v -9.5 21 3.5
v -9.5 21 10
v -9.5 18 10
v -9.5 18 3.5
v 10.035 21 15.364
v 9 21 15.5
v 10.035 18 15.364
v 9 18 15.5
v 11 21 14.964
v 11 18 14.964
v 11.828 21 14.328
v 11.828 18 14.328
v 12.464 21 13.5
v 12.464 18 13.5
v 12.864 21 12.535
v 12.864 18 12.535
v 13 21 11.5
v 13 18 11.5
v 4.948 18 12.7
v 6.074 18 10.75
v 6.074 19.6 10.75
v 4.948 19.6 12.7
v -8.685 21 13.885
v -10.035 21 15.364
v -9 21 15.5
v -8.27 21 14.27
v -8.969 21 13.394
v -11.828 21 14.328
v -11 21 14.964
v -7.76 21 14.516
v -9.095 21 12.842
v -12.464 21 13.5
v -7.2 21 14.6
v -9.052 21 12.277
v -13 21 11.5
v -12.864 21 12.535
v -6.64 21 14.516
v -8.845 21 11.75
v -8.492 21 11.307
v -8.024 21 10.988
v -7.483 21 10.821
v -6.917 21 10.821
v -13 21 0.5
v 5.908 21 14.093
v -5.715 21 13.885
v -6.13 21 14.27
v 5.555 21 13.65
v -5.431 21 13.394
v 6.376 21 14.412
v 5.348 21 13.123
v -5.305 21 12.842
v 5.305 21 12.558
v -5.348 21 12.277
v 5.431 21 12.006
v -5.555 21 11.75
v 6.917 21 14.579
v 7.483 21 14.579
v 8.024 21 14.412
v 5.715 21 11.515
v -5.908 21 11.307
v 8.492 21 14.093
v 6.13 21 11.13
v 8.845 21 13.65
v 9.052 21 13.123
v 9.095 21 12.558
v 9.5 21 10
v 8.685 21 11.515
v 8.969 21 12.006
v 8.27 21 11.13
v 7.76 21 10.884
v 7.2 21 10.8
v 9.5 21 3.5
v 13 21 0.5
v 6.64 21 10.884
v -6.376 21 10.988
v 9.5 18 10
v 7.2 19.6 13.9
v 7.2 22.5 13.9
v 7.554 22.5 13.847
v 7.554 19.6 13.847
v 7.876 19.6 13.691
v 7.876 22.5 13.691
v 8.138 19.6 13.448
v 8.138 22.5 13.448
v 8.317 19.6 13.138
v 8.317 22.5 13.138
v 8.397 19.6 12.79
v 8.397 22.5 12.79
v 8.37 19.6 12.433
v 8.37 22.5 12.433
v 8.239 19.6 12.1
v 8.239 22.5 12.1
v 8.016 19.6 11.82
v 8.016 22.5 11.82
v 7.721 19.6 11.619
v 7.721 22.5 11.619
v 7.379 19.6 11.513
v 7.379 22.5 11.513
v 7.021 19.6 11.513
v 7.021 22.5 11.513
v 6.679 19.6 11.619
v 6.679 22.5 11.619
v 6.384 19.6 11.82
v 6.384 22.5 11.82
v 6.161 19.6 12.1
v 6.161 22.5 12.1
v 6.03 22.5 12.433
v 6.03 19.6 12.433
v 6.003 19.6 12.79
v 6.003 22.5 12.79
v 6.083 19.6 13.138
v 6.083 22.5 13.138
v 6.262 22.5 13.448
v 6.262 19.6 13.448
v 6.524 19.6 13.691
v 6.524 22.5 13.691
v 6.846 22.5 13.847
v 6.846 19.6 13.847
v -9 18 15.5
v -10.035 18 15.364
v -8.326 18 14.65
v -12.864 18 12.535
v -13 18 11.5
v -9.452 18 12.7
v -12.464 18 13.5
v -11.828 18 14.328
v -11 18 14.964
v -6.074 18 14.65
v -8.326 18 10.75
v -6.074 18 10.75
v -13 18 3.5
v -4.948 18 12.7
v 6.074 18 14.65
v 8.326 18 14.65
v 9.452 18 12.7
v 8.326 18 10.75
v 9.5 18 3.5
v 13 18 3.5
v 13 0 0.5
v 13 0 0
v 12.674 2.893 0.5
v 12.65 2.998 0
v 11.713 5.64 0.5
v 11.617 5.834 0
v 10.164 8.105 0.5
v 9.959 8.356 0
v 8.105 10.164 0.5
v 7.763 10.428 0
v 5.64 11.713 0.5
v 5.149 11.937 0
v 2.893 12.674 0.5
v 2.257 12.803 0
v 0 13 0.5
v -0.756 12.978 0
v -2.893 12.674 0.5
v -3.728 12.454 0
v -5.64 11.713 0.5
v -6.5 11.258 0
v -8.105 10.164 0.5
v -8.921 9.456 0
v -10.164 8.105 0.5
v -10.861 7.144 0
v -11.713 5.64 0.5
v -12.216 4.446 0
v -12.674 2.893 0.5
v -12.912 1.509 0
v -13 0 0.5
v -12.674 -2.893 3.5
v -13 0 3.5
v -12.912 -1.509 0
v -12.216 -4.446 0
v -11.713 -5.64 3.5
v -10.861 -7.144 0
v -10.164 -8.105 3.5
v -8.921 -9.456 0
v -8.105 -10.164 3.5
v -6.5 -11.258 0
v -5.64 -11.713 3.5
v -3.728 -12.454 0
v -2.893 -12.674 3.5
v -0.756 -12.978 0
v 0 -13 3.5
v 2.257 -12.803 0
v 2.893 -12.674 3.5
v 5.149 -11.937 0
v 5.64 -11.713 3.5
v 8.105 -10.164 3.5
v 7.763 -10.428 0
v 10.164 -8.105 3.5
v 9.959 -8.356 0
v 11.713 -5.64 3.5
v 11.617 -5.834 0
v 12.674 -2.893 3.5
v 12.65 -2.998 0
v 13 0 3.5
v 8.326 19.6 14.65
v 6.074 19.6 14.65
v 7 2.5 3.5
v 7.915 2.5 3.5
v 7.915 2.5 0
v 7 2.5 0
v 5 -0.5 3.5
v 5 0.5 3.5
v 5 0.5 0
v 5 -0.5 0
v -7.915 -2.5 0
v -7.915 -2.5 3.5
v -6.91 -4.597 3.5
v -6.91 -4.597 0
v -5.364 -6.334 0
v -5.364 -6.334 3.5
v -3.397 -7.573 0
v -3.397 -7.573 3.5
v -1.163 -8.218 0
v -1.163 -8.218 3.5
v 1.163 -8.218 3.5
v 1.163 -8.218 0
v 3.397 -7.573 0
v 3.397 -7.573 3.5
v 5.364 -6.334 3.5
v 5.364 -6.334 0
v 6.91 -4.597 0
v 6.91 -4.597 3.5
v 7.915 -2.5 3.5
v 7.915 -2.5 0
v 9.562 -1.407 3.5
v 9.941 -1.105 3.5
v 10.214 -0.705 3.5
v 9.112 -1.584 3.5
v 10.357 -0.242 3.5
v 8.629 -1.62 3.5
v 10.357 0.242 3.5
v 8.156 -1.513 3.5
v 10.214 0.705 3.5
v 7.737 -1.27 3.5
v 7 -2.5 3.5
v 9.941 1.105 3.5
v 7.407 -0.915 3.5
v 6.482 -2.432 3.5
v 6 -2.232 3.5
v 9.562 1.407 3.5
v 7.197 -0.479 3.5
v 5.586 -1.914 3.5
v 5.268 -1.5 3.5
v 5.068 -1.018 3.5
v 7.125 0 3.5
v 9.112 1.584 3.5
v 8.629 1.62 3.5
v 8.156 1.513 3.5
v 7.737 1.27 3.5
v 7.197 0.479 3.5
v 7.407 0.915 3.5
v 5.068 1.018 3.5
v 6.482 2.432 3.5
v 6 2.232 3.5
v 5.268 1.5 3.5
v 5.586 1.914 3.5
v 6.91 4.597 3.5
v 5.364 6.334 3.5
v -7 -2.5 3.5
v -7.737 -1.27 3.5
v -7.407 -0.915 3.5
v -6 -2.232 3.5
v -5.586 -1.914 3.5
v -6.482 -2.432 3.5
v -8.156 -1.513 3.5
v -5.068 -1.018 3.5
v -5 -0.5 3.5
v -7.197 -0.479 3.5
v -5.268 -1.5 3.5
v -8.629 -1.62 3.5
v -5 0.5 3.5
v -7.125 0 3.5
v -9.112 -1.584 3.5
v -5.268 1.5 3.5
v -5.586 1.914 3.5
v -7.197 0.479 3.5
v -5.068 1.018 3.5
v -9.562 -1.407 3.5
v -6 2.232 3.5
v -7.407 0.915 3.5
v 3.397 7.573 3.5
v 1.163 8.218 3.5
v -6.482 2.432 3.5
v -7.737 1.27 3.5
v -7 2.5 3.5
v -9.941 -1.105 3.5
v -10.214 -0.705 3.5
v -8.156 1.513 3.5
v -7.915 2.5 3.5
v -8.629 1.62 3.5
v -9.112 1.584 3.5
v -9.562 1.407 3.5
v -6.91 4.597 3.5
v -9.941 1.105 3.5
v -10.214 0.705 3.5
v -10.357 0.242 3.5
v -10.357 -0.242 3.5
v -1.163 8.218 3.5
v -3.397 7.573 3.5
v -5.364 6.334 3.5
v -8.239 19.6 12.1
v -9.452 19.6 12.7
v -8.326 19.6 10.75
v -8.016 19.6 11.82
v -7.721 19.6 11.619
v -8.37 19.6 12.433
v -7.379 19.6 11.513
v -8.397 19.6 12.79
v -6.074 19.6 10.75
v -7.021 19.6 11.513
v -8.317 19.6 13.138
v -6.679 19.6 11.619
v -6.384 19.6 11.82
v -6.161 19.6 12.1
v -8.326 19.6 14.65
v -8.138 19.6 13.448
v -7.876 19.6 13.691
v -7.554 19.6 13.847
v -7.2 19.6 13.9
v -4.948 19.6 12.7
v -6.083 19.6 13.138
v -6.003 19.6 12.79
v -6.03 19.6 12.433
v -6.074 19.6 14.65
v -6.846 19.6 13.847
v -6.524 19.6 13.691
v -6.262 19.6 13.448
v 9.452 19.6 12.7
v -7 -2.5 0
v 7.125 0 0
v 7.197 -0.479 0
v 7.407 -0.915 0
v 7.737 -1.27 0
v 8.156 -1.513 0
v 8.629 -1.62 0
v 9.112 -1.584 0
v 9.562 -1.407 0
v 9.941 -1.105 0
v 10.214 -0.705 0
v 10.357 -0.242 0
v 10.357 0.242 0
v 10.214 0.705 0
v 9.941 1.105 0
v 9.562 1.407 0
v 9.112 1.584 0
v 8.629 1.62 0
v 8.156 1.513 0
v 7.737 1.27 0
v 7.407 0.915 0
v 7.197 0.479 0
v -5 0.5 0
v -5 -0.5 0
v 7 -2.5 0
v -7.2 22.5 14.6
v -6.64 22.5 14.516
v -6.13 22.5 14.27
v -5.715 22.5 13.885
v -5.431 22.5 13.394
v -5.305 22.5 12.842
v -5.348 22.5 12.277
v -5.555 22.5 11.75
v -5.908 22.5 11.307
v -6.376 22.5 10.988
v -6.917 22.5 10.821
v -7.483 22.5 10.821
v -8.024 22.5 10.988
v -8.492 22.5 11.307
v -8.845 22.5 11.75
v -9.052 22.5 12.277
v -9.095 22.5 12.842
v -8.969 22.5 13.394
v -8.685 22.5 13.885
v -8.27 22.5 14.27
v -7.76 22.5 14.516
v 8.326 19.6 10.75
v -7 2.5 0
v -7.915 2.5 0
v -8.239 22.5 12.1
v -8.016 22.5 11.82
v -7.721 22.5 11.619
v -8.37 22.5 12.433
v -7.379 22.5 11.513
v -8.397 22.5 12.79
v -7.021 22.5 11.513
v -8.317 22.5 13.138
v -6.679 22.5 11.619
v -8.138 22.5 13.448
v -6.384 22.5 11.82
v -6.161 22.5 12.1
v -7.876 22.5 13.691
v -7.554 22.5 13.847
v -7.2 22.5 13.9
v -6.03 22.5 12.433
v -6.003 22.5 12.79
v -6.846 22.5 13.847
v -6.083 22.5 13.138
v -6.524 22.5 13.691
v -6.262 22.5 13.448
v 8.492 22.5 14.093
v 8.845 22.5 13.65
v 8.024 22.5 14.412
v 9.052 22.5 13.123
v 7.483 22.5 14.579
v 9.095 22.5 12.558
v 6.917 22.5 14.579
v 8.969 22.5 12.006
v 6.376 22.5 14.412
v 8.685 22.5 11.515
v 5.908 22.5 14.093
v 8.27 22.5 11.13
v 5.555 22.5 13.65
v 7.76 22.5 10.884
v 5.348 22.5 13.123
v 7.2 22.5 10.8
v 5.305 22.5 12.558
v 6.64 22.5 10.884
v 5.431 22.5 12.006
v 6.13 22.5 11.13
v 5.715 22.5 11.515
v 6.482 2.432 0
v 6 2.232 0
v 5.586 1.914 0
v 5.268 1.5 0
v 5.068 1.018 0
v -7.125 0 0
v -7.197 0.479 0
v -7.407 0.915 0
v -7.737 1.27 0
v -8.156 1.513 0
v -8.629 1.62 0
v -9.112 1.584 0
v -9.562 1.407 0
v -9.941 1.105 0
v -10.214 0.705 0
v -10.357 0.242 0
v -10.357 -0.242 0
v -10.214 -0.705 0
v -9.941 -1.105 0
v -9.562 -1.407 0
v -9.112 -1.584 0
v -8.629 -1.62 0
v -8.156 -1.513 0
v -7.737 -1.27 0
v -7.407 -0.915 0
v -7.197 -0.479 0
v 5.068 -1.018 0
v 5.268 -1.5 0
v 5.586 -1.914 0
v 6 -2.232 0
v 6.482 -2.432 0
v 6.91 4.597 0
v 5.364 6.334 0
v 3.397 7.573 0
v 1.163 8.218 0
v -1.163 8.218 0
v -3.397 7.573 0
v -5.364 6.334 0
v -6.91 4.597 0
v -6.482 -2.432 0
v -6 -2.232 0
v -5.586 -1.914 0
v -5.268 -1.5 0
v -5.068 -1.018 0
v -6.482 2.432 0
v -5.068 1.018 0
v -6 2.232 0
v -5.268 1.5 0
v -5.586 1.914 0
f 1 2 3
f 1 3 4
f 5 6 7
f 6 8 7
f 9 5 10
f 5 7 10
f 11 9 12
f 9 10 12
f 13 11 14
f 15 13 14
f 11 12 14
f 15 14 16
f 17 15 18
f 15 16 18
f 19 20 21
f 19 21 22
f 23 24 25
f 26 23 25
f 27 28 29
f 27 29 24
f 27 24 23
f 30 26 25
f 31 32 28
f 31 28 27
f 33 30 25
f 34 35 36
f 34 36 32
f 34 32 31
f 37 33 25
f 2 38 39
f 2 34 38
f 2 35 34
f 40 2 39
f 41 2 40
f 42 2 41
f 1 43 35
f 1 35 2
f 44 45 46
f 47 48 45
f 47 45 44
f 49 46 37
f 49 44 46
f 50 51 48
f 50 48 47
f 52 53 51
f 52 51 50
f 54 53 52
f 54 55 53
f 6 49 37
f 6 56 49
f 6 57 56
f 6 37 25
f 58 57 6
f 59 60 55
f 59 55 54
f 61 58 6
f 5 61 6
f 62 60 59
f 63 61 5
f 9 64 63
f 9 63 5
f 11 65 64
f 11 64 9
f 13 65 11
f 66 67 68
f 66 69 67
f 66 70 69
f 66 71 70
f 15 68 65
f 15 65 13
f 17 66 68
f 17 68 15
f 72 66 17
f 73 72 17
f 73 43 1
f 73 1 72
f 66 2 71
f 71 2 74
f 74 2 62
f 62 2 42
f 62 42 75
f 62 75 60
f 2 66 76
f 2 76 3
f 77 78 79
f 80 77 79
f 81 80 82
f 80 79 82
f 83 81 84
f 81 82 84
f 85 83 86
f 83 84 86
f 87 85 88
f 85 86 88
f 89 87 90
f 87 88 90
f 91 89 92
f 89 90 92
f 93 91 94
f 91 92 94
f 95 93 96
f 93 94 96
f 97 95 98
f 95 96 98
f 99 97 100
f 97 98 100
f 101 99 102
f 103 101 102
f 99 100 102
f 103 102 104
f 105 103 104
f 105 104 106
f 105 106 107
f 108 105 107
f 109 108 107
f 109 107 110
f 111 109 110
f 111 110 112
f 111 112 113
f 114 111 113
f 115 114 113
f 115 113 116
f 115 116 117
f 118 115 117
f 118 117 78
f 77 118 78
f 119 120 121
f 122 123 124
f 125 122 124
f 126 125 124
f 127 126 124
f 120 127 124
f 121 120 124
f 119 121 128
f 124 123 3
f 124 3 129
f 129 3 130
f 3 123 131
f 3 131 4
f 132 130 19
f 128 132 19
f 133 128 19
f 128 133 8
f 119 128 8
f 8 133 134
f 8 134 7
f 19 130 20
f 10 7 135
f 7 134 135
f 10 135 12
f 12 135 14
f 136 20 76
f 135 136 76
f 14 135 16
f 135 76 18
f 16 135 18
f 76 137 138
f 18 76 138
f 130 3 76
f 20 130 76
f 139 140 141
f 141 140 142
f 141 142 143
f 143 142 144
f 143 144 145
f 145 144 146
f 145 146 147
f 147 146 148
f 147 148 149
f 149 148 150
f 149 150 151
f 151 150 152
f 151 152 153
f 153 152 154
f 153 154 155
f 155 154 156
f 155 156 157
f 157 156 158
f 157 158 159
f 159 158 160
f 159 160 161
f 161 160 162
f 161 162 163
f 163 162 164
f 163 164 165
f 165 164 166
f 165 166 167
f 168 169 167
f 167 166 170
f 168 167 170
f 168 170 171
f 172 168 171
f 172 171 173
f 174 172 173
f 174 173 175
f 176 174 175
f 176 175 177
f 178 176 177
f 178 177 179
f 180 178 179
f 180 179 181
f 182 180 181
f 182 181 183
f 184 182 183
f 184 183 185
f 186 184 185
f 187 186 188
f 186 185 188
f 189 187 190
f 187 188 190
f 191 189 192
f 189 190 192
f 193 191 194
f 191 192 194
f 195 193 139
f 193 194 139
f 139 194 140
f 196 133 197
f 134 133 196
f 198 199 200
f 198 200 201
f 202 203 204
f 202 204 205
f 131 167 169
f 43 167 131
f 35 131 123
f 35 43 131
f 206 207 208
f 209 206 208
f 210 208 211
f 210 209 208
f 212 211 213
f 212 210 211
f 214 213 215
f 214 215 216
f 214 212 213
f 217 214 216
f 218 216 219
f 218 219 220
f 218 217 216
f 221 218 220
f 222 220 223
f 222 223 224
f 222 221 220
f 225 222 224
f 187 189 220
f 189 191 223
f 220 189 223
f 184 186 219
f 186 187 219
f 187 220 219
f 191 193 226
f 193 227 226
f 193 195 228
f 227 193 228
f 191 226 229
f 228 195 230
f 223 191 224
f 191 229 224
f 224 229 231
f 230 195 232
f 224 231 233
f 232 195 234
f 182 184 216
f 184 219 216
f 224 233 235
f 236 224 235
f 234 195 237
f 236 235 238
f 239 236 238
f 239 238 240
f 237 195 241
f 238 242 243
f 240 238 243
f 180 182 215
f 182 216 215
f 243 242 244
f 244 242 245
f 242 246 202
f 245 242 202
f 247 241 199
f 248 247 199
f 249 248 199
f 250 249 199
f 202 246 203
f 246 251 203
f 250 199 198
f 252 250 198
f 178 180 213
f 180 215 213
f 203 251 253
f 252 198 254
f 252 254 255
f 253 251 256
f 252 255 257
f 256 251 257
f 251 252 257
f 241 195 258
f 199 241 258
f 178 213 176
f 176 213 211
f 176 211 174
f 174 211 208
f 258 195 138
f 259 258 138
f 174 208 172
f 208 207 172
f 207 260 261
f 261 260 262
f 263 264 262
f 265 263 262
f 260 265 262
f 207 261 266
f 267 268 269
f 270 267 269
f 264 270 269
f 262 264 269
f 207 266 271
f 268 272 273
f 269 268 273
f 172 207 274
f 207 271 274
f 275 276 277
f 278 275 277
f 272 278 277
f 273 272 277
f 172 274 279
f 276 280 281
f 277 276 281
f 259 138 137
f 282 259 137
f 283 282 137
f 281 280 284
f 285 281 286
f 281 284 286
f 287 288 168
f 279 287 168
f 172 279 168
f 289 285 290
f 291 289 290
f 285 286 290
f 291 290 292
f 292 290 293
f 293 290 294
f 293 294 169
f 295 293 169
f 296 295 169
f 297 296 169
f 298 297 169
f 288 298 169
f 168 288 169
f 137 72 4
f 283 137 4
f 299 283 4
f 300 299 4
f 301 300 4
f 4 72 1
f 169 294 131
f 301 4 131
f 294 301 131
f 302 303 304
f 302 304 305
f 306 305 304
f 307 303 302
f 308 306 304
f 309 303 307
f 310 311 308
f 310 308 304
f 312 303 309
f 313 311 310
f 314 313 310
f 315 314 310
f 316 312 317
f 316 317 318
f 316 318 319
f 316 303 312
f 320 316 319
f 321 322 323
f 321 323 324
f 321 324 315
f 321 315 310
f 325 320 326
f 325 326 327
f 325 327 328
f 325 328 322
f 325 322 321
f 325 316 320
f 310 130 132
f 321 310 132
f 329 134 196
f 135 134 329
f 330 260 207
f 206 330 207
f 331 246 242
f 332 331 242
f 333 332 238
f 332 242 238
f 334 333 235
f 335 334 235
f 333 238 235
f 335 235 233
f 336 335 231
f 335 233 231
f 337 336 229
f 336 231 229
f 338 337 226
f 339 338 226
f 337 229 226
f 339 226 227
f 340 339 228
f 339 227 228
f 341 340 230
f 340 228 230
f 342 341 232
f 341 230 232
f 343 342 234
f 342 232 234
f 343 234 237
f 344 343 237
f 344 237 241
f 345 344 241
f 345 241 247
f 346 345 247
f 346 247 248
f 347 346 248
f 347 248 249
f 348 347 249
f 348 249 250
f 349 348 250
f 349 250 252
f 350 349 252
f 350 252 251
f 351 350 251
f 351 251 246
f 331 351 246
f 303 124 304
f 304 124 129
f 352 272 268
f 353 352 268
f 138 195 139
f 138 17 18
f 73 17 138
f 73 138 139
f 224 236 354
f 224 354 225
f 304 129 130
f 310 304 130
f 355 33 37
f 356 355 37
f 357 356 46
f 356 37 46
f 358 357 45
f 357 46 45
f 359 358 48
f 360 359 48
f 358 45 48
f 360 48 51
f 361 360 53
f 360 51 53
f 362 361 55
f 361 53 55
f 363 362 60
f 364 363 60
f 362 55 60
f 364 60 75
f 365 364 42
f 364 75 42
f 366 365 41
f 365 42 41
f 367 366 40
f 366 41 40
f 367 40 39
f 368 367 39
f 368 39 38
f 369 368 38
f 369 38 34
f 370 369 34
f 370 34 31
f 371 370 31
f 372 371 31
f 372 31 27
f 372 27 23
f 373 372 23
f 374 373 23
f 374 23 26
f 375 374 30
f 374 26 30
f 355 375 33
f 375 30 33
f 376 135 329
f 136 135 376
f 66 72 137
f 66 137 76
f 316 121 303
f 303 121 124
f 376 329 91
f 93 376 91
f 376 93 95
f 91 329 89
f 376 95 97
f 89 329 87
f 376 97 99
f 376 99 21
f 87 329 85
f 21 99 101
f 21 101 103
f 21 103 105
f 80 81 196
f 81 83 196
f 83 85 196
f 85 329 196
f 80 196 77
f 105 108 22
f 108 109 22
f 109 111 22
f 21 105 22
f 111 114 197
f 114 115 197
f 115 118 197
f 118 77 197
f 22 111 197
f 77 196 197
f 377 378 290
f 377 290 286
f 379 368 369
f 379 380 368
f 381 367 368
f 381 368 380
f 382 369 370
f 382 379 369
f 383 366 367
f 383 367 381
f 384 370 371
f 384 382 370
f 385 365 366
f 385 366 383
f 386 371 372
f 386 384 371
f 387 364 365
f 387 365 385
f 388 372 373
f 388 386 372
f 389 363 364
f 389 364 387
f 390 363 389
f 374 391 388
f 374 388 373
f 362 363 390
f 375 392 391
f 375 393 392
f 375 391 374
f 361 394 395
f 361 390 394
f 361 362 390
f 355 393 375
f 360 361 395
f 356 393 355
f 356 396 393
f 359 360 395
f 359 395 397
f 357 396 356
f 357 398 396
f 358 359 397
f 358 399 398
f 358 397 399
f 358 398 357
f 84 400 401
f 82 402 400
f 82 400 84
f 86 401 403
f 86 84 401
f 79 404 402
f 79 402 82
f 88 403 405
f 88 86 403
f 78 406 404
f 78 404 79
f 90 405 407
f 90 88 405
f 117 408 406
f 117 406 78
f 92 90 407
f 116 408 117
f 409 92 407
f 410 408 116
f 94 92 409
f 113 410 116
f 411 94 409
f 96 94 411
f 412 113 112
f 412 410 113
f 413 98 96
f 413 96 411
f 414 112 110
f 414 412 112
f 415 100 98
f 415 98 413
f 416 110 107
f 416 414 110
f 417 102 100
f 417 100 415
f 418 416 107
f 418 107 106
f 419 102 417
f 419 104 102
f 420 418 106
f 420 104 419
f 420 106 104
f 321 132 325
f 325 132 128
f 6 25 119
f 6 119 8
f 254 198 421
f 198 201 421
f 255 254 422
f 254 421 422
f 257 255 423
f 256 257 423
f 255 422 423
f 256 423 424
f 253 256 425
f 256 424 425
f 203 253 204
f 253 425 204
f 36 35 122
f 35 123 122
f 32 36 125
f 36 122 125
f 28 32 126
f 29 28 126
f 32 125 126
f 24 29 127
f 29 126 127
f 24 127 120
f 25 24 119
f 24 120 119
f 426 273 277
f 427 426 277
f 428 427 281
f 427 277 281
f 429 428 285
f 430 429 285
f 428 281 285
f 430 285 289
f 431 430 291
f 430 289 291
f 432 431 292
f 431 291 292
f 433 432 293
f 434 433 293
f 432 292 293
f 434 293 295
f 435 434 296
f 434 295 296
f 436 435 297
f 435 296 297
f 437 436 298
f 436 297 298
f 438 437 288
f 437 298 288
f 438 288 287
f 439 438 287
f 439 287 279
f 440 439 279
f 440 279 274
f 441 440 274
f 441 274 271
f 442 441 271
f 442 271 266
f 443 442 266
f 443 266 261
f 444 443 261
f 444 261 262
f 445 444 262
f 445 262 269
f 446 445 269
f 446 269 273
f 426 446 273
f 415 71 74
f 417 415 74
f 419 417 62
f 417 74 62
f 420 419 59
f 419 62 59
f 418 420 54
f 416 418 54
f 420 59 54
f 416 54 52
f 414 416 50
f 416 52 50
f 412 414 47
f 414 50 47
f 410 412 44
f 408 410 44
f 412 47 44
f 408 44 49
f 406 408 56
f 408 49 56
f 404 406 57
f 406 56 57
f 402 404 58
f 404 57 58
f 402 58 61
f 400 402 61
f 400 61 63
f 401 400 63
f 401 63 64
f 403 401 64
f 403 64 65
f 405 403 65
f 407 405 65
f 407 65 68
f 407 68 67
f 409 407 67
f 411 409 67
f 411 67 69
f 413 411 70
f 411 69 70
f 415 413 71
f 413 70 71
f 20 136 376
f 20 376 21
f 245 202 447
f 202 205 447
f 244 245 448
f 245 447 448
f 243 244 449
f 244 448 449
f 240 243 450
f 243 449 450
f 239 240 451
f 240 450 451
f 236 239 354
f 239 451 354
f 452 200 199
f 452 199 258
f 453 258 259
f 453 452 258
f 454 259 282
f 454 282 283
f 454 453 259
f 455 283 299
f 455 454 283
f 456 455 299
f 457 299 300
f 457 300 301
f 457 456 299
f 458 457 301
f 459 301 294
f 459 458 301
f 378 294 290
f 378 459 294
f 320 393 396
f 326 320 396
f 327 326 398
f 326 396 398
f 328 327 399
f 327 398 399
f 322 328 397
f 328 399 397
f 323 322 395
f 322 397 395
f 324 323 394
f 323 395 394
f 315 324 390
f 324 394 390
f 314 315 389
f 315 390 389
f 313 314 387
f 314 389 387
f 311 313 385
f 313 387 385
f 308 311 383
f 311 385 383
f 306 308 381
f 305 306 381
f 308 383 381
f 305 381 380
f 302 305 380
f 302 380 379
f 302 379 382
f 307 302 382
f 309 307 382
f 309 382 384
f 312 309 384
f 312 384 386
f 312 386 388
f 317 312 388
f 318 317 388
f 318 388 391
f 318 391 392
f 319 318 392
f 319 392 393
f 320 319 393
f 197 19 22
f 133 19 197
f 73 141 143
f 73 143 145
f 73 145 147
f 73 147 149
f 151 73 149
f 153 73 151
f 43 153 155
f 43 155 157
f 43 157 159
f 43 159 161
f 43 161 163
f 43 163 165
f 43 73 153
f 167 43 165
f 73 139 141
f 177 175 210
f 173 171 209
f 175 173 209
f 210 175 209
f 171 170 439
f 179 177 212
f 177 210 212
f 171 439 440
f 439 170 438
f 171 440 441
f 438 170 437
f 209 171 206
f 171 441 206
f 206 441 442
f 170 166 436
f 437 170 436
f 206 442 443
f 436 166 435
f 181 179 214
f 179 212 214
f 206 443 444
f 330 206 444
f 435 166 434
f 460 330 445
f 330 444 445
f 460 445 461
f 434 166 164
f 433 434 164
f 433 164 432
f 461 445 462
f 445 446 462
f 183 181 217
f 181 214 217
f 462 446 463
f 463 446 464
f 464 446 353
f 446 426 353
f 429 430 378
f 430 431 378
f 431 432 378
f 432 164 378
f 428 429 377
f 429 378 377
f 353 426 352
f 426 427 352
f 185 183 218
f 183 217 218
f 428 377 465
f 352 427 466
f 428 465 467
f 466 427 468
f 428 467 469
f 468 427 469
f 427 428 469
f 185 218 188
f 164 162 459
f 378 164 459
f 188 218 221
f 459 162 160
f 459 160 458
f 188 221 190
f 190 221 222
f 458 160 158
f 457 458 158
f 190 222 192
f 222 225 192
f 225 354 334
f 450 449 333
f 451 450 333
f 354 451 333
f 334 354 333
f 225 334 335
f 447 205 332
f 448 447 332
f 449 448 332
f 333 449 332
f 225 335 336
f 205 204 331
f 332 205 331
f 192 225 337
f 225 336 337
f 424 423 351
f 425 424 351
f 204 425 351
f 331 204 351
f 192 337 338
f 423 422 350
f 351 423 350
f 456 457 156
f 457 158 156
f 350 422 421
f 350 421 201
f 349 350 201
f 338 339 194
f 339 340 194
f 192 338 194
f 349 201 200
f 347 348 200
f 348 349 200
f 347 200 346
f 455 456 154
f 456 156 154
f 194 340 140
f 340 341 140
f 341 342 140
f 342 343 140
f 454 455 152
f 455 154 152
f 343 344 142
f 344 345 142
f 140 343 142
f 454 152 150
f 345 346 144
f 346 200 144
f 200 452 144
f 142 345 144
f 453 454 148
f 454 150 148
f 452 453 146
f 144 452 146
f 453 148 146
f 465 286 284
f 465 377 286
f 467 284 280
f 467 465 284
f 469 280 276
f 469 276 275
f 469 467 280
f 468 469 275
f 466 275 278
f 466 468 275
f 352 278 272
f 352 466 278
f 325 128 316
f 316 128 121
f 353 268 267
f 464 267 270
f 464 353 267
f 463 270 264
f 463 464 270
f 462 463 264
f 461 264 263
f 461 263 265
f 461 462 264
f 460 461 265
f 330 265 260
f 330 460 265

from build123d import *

# Parameters (mm, degrees)
ESBO_O1_R                = 13
ESBO_O1_R_2              = 8.3
RESSALTO_EXTRUS_O1_DEPTH = 3.5
RESSALTO_EXTRUS_O2_DEPTH = 3.5
ESBO_O4_R                = 1.625
CORTE_EXTRUS_O2_DEPTH    = 19.714967272
FILETE1_R                = 2
RESSALTO_EXTRUS_O4_START = -3
RESSALTO_EXTRUS_O4_DEPTH = 3
RESSALTO_EXTRUS_O5_DEPTH = 3
ESBO_O9_R                = 1.9
RESSALTO_EXTRUS_O6_DEPTH = 1.5
ESBO_O10_R               = 1.2
CORTE_EXTRUS_O3_DEPTH    = 41.859515416
CORTE_EXTRUS_O4_DEPTH    = 1.6
FILETE2_R                = 4


with BuildPart() as part:
    # Esboço1 → Ressalto-extrusão1 (new body)
    with BuildSketch(Plane.XY):
        Circle(ESBO_O1_R)
        Circle(ESBO_O1_R_2, mode=Mode.SUBTRACT)
    extrude(amount=RESSALTO_EXTRUS_O1_DEPTH)

    # Esboço3 → Ressalto-extrusão2 (add, through all)
    with BuildSketch(Plane.XY.offset(3.5)):
        with BuildLine():
            Line((-8.124038405, 2.5), (-5, 2.5))
            Line((-5, 2.5), (-5, -2.5))
            Line((-5, -2.5), (-8.124038405, -2.5))
            ThreePointArc((-8.124038405, -2.5), (-8.5, 0), (-8.124038405, 2.5))
        make_face()
        with BuildLine():
            Line((5, 2.5), (5, -2.5))
            Line((5, -2.5), (8.124038405, -2.5))
            ThreePointArc((8.124038405, -2.5), (8.5, 0), (8.124038405, 2.5))
            Line((8.124038405, 2.5), (5, 2.5))
        make_face()
    extrude(amount=-RESSALTO_EXTRUS_O2_DEPTH)

    # Esboço4 → Corte-extrusão2 (cut, through all)
    with BuildSketch(Plane.XY.offset(3.5)):
        with Locations((-8.75, 0)):
            Circle(ESBO_O4_R)
        with Locations(Location((8.75, 0, 0), (0, 0, 180))):
            Circle(ESBO_O4_R)
    extrude(amount=-CORTE_EXTRUS_O2_DEPTH, mode=Mode.SUBTRACT)

    # Filete1
    filete1_edges = [part.edges().sort_by_distance(p)[0] for p in [
        (-5, 2.5, 1.75),
        (-5, -2.5, 1.75),
        (5, -2.5, 1.75),
        (5, 2.5, 1.75),
    ]]
    fillet(filete1_edges, radius=FILETE1_R)

    # Esboço7 → Ressalto-extrusão4 (add)
    with BuildSketch(Plane.XY.offset(3.5).offset(RESSALTO_EXTRUS_O4_START)):
        with BuildLine():
            Line((-13, 0), (-13, 21))
            Line((-13, 21), (13, 21))
            Line((13, 21), (13, 0))
            ThreePointArc((13, 0), (0, 13), (-13, 0))
        make_face()
    extrude(amount=RESSALTO_EXTRUS_O4_DEPTH)

    # Esboço8 → Ressalto-extrusão5 (add)
    with BuildSketch(Plane(origin=(0, 21, 0), x_dir=(1, 0, 0), z_dir=(0, 1, 0))):
        Polygon((-13, -3.5), (-13, -15.5), (13, -15.5), (13, -3.5), (9.5, -3.5), (9.5, -10), (-9.5, -10), (-9.5, -3.5), align=None)
    extrude(amount=-RESSALTO_EXTRUS_O5_DEPTH)

    # Esboço9 → Ressalto-extrusão6 (add)
    with BuildSketch(Plane(origin=(0, 21, 0), x_dir=(1, 0, 0), z_dir=(0, 1, 0))):
        with Locations(Location((-7.2, -12.7, 0), (0, 0, 270))):
            Circle(ESBO_O9_R)
        with Locations(Location((7.2, -12.7, 0), (0, 0, 90))):
            Circle(ESBO_O9_R)
    extrude(amount=RESSALTO_EXTRUS_O6_DEPTH)

    # Esboço10 → Corte-extrusão3 (cut, through all)
    with BuildSketch(Plane(origin=(0, 22.5, 0), x_dir=(1, 0, 0), z_dir=(0, 1, 0))):
        with Locations(Location((-7.2, -12.7, 0), (0, 0, 270))):
            Circle(ESBO_O10_R)
        with Locations(Location((7.2, -12.7, 0), (0, 0, 270))):
            Circle(ESBO_O10_R)
    extrude(amount=-CORTE_EXTRUS_O3_DEPTH, mode=Mode.SUBTRACT)

    # Esboço11 → Corte-extrusão4 (cut)
    with BuildSketch(Plane.XZ.offset(-18)):
        Polygon((-4.94833395, 12.7), (-6.074166975, 14.65), (-8.325833025, 14.65), (-9.45166605, 12.7), (-8.325833025, 10.75), (-6.074166975, 10.75), align=None)
        Polygon((6.074166975, 10.75), (4.94833395, 12.7), (6.074166975, 14.65), (8.325833025, 14.65), (9.45166605, 12.7), (8.325833025, 10.75), align=None)
    extrude(amount=-CORTE_EXTRUS_O4_DEPTH, mode=Mode.SUBTRACT)

    # Filete2
    filete2_edges = [part.edges().sort_by_distance(p)[0] for p in [
        (13, 19.5, 15.5),
        (-13, 19.5, 15.5),
    ]]
    fillet(filete2_edges, radius=FILETE2_R)


solid = part.part
